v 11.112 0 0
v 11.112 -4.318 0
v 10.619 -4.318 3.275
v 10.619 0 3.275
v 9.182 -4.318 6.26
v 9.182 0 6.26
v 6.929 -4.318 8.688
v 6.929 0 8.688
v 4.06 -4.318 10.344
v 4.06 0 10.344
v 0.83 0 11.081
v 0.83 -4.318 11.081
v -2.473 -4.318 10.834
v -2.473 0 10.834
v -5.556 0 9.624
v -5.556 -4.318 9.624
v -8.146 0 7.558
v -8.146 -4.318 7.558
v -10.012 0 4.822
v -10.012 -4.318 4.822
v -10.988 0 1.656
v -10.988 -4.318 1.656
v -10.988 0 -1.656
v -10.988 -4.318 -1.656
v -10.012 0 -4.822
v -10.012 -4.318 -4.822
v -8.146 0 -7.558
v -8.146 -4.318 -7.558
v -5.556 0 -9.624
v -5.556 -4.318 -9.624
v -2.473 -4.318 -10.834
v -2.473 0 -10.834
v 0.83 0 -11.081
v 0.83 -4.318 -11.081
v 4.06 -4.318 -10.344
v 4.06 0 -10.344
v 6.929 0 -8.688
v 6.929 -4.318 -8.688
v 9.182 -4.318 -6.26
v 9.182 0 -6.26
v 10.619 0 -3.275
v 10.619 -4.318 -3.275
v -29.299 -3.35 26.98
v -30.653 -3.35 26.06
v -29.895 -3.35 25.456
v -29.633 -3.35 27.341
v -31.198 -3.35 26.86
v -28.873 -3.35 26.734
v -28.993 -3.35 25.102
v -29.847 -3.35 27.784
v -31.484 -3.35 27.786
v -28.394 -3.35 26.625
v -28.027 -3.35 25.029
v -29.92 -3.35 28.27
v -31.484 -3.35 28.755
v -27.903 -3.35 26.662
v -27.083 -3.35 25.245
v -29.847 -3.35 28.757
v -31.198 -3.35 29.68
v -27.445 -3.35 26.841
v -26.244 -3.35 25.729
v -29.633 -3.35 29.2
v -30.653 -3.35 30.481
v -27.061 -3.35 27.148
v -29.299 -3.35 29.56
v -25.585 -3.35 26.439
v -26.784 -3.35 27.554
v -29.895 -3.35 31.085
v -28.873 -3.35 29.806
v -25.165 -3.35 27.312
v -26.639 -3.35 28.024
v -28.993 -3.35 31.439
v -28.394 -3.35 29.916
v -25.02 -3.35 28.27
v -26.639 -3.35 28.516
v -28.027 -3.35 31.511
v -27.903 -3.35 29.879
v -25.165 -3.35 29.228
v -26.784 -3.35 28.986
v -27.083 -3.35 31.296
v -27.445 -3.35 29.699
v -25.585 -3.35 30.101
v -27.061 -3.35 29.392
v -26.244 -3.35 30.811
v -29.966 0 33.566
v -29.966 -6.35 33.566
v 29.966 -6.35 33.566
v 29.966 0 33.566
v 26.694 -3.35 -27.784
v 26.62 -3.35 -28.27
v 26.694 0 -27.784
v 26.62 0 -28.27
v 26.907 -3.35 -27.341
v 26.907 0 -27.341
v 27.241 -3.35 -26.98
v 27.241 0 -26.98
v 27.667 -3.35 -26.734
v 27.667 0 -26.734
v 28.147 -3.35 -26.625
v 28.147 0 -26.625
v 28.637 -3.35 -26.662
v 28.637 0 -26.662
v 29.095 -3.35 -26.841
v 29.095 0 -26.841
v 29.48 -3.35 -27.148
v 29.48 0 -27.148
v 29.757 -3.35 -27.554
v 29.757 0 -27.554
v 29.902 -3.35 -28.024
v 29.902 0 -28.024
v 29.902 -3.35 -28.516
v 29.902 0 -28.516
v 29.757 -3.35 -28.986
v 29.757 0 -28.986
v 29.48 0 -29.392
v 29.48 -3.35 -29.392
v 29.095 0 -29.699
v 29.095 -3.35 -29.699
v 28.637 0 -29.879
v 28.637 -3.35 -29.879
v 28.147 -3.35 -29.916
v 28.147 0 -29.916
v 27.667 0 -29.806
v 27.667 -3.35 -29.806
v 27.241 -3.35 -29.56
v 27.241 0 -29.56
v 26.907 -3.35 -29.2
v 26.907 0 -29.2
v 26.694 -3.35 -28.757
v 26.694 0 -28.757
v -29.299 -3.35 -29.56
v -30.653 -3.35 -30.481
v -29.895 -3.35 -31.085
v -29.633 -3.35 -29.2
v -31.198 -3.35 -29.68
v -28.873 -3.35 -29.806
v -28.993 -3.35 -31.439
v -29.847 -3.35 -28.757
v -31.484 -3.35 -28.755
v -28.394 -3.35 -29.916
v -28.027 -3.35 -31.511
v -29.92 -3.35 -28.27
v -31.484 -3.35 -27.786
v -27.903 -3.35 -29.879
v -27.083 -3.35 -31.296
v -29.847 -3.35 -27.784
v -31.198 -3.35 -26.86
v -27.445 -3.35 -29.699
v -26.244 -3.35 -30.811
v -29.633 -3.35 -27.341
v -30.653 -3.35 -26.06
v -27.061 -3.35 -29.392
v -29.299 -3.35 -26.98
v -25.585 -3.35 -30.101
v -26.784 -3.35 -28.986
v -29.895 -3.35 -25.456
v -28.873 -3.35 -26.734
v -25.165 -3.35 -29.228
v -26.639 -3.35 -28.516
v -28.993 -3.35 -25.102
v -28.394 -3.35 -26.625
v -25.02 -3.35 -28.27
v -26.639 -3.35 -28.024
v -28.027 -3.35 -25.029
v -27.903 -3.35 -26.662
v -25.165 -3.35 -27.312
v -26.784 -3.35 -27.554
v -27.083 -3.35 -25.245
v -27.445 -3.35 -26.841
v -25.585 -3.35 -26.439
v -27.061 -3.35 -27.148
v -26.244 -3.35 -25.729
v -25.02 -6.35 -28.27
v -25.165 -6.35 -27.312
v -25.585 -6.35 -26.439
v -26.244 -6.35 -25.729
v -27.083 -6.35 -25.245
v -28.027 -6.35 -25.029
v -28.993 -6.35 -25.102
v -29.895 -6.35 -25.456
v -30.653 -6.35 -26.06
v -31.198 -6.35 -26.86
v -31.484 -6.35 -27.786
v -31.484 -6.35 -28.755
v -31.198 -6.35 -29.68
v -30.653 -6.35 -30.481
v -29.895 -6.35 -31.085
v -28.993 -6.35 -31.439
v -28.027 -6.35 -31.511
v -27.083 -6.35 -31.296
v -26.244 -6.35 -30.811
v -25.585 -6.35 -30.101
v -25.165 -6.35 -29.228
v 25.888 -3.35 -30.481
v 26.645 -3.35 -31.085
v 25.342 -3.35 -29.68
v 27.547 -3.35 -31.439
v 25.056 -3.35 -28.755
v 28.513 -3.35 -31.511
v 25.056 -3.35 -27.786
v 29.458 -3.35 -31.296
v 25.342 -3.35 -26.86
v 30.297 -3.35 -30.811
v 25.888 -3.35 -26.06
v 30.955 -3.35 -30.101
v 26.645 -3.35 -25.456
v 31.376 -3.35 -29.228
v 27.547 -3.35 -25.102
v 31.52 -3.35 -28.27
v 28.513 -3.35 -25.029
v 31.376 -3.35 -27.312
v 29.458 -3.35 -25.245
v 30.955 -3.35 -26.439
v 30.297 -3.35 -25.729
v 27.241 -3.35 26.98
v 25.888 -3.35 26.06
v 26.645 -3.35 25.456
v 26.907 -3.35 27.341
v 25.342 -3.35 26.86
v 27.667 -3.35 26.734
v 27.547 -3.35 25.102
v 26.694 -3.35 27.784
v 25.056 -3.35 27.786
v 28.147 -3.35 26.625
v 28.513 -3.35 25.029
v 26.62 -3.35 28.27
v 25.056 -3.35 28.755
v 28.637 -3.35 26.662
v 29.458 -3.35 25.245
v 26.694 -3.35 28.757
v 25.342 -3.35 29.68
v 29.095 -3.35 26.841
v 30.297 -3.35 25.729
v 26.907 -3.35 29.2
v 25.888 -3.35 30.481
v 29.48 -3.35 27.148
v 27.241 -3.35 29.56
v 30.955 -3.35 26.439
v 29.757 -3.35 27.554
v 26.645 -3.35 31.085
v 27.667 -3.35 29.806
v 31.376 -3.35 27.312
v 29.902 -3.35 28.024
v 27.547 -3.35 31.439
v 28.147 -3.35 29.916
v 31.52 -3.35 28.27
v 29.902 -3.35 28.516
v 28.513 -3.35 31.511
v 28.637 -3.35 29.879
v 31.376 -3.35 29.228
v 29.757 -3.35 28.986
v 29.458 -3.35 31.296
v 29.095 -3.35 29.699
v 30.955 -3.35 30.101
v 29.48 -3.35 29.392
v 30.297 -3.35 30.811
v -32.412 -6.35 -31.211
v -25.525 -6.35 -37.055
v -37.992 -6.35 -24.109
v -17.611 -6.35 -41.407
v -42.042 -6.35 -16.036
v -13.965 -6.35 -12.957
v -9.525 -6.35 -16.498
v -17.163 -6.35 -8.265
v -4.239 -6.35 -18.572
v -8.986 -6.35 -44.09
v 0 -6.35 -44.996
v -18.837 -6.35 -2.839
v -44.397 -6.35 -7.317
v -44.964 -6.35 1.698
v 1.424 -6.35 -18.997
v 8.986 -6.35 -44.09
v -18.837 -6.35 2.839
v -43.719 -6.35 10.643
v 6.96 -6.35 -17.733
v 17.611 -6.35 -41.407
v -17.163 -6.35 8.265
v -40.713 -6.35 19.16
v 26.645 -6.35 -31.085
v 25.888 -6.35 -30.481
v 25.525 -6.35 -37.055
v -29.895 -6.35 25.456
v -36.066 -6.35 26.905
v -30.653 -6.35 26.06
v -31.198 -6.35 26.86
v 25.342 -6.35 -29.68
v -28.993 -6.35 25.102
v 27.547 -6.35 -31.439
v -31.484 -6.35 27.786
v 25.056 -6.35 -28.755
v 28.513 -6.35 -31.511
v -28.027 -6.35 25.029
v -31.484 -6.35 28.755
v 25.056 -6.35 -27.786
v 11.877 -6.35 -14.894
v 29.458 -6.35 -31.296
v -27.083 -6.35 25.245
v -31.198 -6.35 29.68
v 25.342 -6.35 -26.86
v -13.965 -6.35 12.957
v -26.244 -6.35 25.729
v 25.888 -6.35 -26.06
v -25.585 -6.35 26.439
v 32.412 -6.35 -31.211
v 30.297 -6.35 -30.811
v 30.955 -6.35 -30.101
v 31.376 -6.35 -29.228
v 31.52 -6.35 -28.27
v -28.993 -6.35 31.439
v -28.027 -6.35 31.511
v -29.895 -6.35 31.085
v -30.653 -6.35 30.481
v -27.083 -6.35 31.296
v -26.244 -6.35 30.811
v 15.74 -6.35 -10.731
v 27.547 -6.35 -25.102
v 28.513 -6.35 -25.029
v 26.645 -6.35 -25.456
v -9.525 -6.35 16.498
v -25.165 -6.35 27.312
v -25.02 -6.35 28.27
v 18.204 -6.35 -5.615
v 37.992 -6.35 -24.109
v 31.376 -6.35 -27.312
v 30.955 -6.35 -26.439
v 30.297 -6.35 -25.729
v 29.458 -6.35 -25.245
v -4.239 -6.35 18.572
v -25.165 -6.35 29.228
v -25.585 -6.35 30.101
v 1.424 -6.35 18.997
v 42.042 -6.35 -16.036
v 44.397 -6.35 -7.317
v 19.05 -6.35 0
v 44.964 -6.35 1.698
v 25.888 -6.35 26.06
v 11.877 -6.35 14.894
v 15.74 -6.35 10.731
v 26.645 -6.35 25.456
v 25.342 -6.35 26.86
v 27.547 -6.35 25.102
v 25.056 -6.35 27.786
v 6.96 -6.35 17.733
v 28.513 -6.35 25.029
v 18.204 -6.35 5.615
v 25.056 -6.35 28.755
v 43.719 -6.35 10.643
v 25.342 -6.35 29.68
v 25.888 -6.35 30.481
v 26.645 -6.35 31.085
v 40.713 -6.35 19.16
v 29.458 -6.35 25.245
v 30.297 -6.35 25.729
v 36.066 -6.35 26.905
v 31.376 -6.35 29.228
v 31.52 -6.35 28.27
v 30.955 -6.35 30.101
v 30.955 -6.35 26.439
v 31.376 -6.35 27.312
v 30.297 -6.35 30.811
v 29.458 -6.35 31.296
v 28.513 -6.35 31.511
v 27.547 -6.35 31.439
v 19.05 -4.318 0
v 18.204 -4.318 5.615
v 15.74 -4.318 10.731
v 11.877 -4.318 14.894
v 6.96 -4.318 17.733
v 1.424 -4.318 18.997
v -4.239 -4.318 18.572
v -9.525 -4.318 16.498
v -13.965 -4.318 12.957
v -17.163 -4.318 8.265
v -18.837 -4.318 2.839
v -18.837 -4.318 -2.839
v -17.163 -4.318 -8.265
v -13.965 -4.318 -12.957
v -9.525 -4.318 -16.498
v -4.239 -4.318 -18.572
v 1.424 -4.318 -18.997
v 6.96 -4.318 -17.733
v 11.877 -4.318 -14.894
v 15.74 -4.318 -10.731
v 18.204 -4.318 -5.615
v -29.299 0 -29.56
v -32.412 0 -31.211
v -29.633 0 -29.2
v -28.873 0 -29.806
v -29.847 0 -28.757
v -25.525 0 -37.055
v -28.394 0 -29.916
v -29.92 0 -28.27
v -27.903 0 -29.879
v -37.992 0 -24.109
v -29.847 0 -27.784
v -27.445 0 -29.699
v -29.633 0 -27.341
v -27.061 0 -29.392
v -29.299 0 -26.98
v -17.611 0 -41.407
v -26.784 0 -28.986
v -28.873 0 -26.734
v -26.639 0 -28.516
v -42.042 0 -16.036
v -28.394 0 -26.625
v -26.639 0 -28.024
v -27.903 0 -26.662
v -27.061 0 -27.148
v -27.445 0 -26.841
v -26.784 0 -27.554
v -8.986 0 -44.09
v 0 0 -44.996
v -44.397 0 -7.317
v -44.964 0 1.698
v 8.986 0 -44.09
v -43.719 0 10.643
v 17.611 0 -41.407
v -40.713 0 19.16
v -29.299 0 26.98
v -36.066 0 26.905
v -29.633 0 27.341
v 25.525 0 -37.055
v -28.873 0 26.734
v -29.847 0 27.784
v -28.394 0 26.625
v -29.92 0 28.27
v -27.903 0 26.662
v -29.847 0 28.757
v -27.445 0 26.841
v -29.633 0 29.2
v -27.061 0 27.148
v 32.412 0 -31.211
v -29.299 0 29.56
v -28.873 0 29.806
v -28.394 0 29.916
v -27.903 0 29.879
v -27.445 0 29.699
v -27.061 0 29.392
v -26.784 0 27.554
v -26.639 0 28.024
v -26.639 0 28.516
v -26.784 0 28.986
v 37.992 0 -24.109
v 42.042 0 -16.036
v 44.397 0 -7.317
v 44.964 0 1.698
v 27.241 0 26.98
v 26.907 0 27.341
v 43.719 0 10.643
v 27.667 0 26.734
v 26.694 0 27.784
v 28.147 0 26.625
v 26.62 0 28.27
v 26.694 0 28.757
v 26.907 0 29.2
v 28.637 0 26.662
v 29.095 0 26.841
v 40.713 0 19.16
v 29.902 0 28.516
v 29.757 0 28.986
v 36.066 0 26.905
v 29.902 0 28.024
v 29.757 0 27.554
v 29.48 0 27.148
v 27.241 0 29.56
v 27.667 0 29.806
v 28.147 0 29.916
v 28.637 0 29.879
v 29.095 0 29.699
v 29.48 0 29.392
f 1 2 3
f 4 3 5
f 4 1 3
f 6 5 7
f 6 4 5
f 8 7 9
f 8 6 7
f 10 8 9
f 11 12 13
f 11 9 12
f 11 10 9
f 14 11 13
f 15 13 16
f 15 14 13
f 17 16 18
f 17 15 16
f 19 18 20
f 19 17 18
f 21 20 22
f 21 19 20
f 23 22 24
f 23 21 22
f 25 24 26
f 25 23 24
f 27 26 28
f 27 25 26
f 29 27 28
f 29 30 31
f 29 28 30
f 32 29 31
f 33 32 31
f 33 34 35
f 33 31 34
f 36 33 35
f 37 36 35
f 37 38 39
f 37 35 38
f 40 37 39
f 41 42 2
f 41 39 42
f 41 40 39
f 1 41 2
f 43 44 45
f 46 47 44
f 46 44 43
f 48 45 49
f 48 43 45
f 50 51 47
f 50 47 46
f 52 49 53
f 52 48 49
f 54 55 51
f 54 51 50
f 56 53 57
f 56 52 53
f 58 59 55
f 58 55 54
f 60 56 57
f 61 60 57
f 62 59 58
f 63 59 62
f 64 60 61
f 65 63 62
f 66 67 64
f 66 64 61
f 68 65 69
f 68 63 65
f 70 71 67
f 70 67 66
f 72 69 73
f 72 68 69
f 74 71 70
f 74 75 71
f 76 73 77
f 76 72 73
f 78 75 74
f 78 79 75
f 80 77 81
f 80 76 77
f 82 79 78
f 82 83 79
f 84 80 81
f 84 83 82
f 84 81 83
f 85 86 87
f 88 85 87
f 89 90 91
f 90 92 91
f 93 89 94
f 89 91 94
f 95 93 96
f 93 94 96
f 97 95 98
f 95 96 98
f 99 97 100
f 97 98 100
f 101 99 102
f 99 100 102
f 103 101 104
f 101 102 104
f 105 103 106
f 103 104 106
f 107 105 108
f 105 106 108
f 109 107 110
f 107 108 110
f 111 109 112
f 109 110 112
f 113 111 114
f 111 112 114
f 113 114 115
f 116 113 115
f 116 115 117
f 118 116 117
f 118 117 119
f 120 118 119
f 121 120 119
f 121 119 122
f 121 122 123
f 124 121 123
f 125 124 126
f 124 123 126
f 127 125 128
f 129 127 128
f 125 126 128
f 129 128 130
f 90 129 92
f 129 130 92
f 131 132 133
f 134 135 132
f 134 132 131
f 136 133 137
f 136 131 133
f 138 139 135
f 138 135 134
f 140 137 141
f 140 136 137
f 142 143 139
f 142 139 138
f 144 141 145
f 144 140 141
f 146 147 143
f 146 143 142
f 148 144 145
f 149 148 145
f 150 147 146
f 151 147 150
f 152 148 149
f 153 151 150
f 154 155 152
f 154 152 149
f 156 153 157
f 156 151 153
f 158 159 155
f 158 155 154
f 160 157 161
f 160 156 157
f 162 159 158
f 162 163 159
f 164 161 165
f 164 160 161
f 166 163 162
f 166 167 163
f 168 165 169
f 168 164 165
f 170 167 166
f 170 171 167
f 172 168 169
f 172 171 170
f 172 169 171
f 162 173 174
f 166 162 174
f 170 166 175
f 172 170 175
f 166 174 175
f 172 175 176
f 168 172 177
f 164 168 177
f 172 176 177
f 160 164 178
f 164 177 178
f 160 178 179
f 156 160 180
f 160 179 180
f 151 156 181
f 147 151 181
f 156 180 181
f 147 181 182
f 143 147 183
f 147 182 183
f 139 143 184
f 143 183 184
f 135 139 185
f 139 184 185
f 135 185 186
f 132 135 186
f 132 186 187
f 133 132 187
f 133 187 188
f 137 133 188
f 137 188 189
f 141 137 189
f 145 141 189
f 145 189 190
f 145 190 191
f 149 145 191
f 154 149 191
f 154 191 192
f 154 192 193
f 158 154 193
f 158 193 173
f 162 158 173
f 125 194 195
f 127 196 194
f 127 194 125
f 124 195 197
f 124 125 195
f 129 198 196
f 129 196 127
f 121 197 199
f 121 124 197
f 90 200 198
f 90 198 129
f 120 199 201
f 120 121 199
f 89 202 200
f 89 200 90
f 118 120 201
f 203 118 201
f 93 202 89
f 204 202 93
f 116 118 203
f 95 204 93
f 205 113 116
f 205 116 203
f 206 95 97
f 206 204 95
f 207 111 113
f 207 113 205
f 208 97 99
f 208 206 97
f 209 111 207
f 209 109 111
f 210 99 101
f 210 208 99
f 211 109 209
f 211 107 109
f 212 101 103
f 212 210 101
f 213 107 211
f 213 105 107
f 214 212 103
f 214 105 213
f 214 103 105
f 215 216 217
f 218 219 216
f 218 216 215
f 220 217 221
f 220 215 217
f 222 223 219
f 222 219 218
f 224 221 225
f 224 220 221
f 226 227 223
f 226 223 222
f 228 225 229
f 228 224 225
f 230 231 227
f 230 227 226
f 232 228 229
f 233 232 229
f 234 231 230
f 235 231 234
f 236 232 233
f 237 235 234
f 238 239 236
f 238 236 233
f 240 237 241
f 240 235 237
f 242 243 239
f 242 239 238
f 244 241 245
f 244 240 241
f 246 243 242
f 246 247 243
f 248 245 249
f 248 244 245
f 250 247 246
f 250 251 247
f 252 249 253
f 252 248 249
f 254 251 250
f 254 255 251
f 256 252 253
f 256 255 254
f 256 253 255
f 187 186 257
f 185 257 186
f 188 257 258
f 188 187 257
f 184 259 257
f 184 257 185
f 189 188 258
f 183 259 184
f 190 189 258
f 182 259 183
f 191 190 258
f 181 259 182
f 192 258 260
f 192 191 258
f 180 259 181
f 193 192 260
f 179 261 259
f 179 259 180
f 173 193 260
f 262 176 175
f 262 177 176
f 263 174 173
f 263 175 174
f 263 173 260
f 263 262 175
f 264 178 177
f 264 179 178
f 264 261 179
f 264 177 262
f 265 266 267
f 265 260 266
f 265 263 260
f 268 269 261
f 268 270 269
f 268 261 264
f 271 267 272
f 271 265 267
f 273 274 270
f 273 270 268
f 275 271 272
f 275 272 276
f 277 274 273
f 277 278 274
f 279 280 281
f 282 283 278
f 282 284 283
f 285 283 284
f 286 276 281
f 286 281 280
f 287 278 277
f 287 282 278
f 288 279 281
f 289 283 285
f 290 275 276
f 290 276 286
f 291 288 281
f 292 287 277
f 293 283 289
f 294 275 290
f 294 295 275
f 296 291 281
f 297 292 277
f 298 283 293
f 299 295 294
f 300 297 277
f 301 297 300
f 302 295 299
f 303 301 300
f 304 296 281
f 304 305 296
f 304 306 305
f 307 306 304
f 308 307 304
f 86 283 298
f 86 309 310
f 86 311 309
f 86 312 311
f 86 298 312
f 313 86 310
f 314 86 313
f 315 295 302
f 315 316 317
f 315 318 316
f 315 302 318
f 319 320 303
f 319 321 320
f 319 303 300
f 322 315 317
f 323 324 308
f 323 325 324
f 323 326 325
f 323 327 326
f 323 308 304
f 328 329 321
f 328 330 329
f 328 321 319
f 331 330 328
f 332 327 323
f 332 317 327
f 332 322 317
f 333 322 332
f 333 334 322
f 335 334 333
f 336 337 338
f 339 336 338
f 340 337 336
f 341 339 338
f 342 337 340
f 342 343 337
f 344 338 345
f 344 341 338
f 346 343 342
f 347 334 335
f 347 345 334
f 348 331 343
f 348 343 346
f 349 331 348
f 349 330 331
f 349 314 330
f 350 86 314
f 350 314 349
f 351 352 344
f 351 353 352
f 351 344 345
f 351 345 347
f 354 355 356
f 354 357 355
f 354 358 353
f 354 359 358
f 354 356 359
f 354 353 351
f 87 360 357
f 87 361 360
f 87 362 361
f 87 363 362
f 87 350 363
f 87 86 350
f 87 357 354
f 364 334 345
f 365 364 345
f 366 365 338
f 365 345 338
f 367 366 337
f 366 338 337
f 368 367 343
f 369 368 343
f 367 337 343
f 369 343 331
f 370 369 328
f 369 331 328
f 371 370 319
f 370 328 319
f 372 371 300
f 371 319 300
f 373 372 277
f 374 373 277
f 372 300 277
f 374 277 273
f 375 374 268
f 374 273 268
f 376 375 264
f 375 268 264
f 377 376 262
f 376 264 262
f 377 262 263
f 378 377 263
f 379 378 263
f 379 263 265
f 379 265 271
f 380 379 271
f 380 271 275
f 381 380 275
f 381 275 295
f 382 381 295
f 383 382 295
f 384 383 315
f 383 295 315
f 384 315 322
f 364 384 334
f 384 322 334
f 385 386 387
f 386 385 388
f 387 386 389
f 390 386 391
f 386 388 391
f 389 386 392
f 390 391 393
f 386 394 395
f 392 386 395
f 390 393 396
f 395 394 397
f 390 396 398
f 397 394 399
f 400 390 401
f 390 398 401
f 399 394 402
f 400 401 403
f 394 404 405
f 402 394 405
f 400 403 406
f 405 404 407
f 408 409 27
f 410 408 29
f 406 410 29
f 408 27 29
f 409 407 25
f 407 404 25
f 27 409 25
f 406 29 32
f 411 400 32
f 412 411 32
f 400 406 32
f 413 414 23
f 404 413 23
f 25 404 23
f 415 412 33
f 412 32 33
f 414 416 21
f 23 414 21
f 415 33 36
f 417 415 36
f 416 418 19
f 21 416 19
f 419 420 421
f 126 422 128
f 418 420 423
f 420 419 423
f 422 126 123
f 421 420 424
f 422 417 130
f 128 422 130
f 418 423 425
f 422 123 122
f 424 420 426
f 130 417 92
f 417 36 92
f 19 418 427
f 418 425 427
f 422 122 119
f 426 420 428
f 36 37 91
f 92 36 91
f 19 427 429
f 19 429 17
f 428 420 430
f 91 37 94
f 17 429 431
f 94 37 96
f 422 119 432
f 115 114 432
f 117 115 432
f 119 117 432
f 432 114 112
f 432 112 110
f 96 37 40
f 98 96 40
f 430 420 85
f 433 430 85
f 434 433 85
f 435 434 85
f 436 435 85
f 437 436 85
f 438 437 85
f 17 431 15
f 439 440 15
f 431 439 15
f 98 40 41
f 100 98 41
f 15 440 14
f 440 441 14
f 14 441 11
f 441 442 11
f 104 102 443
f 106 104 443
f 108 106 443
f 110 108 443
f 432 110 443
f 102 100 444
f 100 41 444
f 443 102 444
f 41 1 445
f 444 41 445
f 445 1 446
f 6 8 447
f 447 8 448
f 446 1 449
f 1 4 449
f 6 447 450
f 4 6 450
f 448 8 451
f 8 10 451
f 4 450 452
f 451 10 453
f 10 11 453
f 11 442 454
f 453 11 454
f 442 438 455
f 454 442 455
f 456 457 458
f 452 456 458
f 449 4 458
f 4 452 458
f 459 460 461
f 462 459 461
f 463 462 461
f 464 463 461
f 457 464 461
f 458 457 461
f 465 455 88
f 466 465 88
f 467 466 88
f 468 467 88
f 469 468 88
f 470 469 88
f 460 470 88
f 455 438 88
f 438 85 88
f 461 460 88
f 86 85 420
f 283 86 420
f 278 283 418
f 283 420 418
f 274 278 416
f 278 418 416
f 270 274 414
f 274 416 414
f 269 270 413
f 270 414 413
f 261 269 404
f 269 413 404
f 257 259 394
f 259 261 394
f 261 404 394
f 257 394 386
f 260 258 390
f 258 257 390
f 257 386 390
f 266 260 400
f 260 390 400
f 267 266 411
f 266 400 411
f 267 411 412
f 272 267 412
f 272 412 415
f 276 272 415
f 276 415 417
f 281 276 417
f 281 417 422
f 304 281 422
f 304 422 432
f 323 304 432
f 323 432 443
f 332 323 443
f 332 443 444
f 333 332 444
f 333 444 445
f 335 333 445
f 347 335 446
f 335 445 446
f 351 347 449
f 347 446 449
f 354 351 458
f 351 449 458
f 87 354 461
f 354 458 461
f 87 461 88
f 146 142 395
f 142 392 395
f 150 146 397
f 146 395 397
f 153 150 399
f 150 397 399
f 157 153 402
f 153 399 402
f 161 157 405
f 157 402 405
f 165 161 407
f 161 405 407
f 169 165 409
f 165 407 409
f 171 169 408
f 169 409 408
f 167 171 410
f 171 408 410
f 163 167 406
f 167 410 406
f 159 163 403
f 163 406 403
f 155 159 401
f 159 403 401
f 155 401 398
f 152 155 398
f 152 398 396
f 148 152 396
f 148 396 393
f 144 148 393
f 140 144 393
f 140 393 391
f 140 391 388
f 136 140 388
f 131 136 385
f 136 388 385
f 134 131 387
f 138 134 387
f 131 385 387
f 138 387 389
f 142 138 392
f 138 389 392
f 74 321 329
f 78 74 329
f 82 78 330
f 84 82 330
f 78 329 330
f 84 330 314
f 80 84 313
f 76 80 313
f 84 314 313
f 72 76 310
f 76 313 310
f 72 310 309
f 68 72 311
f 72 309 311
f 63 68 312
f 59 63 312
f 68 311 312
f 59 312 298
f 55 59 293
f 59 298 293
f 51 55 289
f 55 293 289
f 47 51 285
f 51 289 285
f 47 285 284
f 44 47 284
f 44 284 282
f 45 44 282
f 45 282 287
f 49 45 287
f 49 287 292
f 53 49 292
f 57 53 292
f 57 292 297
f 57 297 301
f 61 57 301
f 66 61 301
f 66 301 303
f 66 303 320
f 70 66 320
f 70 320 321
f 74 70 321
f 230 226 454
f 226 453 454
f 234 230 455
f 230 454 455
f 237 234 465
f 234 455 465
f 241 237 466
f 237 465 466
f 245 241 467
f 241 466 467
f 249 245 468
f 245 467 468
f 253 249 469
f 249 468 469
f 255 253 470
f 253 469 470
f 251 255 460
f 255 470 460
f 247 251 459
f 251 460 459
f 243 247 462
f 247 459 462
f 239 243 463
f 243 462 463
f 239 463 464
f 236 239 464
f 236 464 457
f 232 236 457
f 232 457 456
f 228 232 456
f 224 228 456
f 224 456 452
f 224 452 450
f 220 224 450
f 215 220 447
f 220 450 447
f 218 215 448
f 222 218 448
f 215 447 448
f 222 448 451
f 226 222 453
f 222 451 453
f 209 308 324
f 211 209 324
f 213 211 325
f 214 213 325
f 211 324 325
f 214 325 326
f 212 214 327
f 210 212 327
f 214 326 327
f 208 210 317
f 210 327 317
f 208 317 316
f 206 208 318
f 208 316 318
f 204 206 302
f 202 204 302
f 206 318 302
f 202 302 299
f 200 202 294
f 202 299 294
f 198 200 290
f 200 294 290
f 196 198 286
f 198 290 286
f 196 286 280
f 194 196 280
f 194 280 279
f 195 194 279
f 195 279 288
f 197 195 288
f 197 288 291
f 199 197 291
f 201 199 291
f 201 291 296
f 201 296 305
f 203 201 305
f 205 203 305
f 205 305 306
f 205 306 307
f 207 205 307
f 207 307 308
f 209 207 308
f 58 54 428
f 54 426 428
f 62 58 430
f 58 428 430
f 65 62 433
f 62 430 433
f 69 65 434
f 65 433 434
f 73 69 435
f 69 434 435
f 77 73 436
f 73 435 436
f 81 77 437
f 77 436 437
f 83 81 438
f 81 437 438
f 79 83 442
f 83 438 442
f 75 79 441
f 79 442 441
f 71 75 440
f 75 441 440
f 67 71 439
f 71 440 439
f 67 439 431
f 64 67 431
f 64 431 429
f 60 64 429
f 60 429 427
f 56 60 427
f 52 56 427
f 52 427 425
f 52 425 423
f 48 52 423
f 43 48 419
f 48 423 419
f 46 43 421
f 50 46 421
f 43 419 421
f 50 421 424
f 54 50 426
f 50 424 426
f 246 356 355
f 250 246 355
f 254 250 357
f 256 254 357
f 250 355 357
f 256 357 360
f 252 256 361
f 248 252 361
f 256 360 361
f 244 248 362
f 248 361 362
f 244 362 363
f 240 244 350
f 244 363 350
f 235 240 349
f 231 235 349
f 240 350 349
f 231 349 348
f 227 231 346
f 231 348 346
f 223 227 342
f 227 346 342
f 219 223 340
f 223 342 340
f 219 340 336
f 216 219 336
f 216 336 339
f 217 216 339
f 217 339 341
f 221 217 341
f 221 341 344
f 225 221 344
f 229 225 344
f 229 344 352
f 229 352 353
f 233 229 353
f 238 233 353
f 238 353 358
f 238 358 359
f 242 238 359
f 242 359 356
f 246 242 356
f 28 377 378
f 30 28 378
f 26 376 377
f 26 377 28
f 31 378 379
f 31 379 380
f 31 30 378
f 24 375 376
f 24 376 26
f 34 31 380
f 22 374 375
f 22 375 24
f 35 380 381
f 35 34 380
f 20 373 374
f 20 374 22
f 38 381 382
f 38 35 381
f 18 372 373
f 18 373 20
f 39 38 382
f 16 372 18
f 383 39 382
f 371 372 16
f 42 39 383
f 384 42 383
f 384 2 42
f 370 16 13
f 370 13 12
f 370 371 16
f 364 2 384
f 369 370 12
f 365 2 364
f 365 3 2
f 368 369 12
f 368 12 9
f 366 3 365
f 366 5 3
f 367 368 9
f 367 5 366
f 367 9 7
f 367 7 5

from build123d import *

# Parameters (mm, degrees)
F0_R           = 44.9961
F0_R_2         = 11.1125
F1_DEPTH       = 6.35
F2_R           = 19.05
F3_DEPTH       = 2.032
F5_D           = 3.3
F5_CBORE_D     = 6.5
F5_CBORE_DEPTH = 3
F7_DEPTH       = 25.4


with BuildPart() as f1:
    # F0 (on Front) → F1 (new body)
    with BuildSketch(Plane.XZ):
        Circle(F0_R)
        Circle(F0_R_2, mode=Mode.SUBTRACT)
    extrude(amount=F1_DEPTH)

    # F2 (on face) → F3 (cut)
    with BuildSketch(Plane.XZ.offset(6.35)):
        Circle(F2_R)
    extrude(amount=-F3_DEPTH, mode=Mode.SUBTRACT)

    # F5 (through all)
    with Locations(Plane.XZ.offset(6.35)):
        with Locations((-28.2702, 28.2702), (28.2702, 28.2702), (28.2702, -28.2702), (-28.2702, -28.2702)):
            CounterBoreHole(F5_D / 2, F5_CBORE_D / 2, F5_CBORE_DEPTH)

    # F6 (on face) → F7 (cut)
    with BuildSketch(Plane.XZ.offset(6.35)):
        with BuildLine():
            ThreePointArc((29.9660799238, 33.5661), (0, 44.9961), (-29.9660799238, 33.5661))
            Line((-29.9660799238, 33.5661), (29.9660799238, 33.5661))
        make_face()
    extrude(amount=-F7_DEPTH, mode=Mode.SUBTRACT)


solid = f1.part
